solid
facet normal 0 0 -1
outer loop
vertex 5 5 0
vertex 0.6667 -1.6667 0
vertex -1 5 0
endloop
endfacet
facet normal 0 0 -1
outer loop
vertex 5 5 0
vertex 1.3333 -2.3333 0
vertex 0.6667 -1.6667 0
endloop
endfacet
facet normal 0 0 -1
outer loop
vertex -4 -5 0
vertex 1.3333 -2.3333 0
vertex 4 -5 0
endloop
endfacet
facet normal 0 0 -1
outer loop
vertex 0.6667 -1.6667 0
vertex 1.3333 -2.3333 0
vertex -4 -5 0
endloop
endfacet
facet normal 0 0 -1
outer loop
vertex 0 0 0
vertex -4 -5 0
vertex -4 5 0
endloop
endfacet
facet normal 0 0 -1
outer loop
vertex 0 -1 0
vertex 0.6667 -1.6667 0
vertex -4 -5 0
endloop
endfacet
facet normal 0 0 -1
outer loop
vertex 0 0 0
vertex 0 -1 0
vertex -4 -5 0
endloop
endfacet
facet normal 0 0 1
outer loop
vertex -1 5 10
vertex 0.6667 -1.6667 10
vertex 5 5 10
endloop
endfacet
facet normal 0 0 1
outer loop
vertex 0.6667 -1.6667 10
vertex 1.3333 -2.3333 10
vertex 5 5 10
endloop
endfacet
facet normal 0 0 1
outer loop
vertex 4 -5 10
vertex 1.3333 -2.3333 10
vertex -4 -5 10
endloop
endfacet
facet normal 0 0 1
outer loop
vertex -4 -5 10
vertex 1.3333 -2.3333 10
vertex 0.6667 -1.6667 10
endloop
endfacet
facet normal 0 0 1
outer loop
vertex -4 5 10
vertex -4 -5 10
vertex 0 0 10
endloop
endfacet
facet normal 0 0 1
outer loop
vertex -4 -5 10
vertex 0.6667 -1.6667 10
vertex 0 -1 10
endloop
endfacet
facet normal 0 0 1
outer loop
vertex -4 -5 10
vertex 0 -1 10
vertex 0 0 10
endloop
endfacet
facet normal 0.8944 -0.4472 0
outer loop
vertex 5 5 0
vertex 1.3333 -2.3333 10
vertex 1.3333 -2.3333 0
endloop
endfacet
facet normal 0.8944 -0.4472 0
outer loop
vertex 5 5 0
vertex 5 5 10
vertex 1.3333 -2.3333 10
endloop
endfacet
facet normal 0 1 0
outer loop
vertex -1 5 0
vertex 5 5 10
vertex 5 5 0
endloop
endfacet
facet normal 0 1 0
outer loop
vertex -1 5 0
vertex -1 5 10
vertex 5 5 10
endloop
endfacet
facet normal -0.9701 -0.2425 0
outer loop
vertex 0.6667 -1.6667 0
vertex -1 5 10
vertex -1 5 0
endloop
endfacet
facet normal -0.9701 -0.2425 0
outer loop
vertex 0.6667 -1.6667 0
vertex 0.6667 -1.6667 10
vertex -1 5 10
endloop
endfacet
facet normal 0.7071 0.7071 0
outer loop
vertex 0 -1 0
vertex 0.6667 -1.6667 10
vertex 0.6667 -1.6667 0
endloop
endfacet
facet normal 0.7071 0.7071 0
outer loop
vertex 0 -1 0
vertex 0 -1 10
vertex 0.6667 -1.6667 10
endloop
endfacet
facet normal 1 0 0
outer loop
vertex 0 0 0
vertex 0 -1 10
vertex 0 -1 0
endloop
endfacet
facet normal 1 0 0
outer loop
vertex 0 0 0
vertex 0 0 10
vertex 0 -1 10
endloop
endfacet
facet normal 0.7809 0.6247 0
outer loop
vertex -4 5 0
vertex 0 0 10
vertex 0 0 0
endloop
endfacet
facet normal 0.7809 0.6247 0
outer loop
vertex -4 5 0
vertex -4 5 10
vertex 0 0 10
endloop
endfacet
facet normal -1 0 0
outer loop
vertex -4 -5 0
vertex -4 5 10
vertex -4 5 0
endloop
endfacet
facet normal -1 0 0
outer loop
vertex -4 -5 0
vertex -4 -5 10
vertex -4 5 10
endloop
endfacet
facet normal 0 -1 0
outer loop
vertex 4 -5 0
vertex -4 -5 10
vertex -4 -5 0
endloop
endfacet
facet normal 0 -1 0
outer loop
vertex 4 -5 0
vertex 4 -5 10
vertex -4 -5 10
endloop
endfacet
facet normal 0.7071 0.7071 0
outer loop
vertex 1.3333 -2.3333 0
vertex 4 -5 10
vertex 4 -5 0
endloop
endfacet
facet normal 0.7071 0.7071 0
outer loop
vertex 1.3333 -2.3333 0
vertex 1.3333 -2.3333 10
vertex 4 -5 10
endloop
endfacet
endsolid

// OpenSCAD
/* use with -gran=0.5 */
linear_extrude(height = 10) {
    polygon(
        points=[
            [ 0, 0],
            [ 0, -1],
            [ 4, -5],
            [-4, -5],
            [-4, +5],
        ]
    );
    polygon(
        points=[
            [-1, +5],
            [+1, -3],
            [+5, +5]
        ]
    );
}
